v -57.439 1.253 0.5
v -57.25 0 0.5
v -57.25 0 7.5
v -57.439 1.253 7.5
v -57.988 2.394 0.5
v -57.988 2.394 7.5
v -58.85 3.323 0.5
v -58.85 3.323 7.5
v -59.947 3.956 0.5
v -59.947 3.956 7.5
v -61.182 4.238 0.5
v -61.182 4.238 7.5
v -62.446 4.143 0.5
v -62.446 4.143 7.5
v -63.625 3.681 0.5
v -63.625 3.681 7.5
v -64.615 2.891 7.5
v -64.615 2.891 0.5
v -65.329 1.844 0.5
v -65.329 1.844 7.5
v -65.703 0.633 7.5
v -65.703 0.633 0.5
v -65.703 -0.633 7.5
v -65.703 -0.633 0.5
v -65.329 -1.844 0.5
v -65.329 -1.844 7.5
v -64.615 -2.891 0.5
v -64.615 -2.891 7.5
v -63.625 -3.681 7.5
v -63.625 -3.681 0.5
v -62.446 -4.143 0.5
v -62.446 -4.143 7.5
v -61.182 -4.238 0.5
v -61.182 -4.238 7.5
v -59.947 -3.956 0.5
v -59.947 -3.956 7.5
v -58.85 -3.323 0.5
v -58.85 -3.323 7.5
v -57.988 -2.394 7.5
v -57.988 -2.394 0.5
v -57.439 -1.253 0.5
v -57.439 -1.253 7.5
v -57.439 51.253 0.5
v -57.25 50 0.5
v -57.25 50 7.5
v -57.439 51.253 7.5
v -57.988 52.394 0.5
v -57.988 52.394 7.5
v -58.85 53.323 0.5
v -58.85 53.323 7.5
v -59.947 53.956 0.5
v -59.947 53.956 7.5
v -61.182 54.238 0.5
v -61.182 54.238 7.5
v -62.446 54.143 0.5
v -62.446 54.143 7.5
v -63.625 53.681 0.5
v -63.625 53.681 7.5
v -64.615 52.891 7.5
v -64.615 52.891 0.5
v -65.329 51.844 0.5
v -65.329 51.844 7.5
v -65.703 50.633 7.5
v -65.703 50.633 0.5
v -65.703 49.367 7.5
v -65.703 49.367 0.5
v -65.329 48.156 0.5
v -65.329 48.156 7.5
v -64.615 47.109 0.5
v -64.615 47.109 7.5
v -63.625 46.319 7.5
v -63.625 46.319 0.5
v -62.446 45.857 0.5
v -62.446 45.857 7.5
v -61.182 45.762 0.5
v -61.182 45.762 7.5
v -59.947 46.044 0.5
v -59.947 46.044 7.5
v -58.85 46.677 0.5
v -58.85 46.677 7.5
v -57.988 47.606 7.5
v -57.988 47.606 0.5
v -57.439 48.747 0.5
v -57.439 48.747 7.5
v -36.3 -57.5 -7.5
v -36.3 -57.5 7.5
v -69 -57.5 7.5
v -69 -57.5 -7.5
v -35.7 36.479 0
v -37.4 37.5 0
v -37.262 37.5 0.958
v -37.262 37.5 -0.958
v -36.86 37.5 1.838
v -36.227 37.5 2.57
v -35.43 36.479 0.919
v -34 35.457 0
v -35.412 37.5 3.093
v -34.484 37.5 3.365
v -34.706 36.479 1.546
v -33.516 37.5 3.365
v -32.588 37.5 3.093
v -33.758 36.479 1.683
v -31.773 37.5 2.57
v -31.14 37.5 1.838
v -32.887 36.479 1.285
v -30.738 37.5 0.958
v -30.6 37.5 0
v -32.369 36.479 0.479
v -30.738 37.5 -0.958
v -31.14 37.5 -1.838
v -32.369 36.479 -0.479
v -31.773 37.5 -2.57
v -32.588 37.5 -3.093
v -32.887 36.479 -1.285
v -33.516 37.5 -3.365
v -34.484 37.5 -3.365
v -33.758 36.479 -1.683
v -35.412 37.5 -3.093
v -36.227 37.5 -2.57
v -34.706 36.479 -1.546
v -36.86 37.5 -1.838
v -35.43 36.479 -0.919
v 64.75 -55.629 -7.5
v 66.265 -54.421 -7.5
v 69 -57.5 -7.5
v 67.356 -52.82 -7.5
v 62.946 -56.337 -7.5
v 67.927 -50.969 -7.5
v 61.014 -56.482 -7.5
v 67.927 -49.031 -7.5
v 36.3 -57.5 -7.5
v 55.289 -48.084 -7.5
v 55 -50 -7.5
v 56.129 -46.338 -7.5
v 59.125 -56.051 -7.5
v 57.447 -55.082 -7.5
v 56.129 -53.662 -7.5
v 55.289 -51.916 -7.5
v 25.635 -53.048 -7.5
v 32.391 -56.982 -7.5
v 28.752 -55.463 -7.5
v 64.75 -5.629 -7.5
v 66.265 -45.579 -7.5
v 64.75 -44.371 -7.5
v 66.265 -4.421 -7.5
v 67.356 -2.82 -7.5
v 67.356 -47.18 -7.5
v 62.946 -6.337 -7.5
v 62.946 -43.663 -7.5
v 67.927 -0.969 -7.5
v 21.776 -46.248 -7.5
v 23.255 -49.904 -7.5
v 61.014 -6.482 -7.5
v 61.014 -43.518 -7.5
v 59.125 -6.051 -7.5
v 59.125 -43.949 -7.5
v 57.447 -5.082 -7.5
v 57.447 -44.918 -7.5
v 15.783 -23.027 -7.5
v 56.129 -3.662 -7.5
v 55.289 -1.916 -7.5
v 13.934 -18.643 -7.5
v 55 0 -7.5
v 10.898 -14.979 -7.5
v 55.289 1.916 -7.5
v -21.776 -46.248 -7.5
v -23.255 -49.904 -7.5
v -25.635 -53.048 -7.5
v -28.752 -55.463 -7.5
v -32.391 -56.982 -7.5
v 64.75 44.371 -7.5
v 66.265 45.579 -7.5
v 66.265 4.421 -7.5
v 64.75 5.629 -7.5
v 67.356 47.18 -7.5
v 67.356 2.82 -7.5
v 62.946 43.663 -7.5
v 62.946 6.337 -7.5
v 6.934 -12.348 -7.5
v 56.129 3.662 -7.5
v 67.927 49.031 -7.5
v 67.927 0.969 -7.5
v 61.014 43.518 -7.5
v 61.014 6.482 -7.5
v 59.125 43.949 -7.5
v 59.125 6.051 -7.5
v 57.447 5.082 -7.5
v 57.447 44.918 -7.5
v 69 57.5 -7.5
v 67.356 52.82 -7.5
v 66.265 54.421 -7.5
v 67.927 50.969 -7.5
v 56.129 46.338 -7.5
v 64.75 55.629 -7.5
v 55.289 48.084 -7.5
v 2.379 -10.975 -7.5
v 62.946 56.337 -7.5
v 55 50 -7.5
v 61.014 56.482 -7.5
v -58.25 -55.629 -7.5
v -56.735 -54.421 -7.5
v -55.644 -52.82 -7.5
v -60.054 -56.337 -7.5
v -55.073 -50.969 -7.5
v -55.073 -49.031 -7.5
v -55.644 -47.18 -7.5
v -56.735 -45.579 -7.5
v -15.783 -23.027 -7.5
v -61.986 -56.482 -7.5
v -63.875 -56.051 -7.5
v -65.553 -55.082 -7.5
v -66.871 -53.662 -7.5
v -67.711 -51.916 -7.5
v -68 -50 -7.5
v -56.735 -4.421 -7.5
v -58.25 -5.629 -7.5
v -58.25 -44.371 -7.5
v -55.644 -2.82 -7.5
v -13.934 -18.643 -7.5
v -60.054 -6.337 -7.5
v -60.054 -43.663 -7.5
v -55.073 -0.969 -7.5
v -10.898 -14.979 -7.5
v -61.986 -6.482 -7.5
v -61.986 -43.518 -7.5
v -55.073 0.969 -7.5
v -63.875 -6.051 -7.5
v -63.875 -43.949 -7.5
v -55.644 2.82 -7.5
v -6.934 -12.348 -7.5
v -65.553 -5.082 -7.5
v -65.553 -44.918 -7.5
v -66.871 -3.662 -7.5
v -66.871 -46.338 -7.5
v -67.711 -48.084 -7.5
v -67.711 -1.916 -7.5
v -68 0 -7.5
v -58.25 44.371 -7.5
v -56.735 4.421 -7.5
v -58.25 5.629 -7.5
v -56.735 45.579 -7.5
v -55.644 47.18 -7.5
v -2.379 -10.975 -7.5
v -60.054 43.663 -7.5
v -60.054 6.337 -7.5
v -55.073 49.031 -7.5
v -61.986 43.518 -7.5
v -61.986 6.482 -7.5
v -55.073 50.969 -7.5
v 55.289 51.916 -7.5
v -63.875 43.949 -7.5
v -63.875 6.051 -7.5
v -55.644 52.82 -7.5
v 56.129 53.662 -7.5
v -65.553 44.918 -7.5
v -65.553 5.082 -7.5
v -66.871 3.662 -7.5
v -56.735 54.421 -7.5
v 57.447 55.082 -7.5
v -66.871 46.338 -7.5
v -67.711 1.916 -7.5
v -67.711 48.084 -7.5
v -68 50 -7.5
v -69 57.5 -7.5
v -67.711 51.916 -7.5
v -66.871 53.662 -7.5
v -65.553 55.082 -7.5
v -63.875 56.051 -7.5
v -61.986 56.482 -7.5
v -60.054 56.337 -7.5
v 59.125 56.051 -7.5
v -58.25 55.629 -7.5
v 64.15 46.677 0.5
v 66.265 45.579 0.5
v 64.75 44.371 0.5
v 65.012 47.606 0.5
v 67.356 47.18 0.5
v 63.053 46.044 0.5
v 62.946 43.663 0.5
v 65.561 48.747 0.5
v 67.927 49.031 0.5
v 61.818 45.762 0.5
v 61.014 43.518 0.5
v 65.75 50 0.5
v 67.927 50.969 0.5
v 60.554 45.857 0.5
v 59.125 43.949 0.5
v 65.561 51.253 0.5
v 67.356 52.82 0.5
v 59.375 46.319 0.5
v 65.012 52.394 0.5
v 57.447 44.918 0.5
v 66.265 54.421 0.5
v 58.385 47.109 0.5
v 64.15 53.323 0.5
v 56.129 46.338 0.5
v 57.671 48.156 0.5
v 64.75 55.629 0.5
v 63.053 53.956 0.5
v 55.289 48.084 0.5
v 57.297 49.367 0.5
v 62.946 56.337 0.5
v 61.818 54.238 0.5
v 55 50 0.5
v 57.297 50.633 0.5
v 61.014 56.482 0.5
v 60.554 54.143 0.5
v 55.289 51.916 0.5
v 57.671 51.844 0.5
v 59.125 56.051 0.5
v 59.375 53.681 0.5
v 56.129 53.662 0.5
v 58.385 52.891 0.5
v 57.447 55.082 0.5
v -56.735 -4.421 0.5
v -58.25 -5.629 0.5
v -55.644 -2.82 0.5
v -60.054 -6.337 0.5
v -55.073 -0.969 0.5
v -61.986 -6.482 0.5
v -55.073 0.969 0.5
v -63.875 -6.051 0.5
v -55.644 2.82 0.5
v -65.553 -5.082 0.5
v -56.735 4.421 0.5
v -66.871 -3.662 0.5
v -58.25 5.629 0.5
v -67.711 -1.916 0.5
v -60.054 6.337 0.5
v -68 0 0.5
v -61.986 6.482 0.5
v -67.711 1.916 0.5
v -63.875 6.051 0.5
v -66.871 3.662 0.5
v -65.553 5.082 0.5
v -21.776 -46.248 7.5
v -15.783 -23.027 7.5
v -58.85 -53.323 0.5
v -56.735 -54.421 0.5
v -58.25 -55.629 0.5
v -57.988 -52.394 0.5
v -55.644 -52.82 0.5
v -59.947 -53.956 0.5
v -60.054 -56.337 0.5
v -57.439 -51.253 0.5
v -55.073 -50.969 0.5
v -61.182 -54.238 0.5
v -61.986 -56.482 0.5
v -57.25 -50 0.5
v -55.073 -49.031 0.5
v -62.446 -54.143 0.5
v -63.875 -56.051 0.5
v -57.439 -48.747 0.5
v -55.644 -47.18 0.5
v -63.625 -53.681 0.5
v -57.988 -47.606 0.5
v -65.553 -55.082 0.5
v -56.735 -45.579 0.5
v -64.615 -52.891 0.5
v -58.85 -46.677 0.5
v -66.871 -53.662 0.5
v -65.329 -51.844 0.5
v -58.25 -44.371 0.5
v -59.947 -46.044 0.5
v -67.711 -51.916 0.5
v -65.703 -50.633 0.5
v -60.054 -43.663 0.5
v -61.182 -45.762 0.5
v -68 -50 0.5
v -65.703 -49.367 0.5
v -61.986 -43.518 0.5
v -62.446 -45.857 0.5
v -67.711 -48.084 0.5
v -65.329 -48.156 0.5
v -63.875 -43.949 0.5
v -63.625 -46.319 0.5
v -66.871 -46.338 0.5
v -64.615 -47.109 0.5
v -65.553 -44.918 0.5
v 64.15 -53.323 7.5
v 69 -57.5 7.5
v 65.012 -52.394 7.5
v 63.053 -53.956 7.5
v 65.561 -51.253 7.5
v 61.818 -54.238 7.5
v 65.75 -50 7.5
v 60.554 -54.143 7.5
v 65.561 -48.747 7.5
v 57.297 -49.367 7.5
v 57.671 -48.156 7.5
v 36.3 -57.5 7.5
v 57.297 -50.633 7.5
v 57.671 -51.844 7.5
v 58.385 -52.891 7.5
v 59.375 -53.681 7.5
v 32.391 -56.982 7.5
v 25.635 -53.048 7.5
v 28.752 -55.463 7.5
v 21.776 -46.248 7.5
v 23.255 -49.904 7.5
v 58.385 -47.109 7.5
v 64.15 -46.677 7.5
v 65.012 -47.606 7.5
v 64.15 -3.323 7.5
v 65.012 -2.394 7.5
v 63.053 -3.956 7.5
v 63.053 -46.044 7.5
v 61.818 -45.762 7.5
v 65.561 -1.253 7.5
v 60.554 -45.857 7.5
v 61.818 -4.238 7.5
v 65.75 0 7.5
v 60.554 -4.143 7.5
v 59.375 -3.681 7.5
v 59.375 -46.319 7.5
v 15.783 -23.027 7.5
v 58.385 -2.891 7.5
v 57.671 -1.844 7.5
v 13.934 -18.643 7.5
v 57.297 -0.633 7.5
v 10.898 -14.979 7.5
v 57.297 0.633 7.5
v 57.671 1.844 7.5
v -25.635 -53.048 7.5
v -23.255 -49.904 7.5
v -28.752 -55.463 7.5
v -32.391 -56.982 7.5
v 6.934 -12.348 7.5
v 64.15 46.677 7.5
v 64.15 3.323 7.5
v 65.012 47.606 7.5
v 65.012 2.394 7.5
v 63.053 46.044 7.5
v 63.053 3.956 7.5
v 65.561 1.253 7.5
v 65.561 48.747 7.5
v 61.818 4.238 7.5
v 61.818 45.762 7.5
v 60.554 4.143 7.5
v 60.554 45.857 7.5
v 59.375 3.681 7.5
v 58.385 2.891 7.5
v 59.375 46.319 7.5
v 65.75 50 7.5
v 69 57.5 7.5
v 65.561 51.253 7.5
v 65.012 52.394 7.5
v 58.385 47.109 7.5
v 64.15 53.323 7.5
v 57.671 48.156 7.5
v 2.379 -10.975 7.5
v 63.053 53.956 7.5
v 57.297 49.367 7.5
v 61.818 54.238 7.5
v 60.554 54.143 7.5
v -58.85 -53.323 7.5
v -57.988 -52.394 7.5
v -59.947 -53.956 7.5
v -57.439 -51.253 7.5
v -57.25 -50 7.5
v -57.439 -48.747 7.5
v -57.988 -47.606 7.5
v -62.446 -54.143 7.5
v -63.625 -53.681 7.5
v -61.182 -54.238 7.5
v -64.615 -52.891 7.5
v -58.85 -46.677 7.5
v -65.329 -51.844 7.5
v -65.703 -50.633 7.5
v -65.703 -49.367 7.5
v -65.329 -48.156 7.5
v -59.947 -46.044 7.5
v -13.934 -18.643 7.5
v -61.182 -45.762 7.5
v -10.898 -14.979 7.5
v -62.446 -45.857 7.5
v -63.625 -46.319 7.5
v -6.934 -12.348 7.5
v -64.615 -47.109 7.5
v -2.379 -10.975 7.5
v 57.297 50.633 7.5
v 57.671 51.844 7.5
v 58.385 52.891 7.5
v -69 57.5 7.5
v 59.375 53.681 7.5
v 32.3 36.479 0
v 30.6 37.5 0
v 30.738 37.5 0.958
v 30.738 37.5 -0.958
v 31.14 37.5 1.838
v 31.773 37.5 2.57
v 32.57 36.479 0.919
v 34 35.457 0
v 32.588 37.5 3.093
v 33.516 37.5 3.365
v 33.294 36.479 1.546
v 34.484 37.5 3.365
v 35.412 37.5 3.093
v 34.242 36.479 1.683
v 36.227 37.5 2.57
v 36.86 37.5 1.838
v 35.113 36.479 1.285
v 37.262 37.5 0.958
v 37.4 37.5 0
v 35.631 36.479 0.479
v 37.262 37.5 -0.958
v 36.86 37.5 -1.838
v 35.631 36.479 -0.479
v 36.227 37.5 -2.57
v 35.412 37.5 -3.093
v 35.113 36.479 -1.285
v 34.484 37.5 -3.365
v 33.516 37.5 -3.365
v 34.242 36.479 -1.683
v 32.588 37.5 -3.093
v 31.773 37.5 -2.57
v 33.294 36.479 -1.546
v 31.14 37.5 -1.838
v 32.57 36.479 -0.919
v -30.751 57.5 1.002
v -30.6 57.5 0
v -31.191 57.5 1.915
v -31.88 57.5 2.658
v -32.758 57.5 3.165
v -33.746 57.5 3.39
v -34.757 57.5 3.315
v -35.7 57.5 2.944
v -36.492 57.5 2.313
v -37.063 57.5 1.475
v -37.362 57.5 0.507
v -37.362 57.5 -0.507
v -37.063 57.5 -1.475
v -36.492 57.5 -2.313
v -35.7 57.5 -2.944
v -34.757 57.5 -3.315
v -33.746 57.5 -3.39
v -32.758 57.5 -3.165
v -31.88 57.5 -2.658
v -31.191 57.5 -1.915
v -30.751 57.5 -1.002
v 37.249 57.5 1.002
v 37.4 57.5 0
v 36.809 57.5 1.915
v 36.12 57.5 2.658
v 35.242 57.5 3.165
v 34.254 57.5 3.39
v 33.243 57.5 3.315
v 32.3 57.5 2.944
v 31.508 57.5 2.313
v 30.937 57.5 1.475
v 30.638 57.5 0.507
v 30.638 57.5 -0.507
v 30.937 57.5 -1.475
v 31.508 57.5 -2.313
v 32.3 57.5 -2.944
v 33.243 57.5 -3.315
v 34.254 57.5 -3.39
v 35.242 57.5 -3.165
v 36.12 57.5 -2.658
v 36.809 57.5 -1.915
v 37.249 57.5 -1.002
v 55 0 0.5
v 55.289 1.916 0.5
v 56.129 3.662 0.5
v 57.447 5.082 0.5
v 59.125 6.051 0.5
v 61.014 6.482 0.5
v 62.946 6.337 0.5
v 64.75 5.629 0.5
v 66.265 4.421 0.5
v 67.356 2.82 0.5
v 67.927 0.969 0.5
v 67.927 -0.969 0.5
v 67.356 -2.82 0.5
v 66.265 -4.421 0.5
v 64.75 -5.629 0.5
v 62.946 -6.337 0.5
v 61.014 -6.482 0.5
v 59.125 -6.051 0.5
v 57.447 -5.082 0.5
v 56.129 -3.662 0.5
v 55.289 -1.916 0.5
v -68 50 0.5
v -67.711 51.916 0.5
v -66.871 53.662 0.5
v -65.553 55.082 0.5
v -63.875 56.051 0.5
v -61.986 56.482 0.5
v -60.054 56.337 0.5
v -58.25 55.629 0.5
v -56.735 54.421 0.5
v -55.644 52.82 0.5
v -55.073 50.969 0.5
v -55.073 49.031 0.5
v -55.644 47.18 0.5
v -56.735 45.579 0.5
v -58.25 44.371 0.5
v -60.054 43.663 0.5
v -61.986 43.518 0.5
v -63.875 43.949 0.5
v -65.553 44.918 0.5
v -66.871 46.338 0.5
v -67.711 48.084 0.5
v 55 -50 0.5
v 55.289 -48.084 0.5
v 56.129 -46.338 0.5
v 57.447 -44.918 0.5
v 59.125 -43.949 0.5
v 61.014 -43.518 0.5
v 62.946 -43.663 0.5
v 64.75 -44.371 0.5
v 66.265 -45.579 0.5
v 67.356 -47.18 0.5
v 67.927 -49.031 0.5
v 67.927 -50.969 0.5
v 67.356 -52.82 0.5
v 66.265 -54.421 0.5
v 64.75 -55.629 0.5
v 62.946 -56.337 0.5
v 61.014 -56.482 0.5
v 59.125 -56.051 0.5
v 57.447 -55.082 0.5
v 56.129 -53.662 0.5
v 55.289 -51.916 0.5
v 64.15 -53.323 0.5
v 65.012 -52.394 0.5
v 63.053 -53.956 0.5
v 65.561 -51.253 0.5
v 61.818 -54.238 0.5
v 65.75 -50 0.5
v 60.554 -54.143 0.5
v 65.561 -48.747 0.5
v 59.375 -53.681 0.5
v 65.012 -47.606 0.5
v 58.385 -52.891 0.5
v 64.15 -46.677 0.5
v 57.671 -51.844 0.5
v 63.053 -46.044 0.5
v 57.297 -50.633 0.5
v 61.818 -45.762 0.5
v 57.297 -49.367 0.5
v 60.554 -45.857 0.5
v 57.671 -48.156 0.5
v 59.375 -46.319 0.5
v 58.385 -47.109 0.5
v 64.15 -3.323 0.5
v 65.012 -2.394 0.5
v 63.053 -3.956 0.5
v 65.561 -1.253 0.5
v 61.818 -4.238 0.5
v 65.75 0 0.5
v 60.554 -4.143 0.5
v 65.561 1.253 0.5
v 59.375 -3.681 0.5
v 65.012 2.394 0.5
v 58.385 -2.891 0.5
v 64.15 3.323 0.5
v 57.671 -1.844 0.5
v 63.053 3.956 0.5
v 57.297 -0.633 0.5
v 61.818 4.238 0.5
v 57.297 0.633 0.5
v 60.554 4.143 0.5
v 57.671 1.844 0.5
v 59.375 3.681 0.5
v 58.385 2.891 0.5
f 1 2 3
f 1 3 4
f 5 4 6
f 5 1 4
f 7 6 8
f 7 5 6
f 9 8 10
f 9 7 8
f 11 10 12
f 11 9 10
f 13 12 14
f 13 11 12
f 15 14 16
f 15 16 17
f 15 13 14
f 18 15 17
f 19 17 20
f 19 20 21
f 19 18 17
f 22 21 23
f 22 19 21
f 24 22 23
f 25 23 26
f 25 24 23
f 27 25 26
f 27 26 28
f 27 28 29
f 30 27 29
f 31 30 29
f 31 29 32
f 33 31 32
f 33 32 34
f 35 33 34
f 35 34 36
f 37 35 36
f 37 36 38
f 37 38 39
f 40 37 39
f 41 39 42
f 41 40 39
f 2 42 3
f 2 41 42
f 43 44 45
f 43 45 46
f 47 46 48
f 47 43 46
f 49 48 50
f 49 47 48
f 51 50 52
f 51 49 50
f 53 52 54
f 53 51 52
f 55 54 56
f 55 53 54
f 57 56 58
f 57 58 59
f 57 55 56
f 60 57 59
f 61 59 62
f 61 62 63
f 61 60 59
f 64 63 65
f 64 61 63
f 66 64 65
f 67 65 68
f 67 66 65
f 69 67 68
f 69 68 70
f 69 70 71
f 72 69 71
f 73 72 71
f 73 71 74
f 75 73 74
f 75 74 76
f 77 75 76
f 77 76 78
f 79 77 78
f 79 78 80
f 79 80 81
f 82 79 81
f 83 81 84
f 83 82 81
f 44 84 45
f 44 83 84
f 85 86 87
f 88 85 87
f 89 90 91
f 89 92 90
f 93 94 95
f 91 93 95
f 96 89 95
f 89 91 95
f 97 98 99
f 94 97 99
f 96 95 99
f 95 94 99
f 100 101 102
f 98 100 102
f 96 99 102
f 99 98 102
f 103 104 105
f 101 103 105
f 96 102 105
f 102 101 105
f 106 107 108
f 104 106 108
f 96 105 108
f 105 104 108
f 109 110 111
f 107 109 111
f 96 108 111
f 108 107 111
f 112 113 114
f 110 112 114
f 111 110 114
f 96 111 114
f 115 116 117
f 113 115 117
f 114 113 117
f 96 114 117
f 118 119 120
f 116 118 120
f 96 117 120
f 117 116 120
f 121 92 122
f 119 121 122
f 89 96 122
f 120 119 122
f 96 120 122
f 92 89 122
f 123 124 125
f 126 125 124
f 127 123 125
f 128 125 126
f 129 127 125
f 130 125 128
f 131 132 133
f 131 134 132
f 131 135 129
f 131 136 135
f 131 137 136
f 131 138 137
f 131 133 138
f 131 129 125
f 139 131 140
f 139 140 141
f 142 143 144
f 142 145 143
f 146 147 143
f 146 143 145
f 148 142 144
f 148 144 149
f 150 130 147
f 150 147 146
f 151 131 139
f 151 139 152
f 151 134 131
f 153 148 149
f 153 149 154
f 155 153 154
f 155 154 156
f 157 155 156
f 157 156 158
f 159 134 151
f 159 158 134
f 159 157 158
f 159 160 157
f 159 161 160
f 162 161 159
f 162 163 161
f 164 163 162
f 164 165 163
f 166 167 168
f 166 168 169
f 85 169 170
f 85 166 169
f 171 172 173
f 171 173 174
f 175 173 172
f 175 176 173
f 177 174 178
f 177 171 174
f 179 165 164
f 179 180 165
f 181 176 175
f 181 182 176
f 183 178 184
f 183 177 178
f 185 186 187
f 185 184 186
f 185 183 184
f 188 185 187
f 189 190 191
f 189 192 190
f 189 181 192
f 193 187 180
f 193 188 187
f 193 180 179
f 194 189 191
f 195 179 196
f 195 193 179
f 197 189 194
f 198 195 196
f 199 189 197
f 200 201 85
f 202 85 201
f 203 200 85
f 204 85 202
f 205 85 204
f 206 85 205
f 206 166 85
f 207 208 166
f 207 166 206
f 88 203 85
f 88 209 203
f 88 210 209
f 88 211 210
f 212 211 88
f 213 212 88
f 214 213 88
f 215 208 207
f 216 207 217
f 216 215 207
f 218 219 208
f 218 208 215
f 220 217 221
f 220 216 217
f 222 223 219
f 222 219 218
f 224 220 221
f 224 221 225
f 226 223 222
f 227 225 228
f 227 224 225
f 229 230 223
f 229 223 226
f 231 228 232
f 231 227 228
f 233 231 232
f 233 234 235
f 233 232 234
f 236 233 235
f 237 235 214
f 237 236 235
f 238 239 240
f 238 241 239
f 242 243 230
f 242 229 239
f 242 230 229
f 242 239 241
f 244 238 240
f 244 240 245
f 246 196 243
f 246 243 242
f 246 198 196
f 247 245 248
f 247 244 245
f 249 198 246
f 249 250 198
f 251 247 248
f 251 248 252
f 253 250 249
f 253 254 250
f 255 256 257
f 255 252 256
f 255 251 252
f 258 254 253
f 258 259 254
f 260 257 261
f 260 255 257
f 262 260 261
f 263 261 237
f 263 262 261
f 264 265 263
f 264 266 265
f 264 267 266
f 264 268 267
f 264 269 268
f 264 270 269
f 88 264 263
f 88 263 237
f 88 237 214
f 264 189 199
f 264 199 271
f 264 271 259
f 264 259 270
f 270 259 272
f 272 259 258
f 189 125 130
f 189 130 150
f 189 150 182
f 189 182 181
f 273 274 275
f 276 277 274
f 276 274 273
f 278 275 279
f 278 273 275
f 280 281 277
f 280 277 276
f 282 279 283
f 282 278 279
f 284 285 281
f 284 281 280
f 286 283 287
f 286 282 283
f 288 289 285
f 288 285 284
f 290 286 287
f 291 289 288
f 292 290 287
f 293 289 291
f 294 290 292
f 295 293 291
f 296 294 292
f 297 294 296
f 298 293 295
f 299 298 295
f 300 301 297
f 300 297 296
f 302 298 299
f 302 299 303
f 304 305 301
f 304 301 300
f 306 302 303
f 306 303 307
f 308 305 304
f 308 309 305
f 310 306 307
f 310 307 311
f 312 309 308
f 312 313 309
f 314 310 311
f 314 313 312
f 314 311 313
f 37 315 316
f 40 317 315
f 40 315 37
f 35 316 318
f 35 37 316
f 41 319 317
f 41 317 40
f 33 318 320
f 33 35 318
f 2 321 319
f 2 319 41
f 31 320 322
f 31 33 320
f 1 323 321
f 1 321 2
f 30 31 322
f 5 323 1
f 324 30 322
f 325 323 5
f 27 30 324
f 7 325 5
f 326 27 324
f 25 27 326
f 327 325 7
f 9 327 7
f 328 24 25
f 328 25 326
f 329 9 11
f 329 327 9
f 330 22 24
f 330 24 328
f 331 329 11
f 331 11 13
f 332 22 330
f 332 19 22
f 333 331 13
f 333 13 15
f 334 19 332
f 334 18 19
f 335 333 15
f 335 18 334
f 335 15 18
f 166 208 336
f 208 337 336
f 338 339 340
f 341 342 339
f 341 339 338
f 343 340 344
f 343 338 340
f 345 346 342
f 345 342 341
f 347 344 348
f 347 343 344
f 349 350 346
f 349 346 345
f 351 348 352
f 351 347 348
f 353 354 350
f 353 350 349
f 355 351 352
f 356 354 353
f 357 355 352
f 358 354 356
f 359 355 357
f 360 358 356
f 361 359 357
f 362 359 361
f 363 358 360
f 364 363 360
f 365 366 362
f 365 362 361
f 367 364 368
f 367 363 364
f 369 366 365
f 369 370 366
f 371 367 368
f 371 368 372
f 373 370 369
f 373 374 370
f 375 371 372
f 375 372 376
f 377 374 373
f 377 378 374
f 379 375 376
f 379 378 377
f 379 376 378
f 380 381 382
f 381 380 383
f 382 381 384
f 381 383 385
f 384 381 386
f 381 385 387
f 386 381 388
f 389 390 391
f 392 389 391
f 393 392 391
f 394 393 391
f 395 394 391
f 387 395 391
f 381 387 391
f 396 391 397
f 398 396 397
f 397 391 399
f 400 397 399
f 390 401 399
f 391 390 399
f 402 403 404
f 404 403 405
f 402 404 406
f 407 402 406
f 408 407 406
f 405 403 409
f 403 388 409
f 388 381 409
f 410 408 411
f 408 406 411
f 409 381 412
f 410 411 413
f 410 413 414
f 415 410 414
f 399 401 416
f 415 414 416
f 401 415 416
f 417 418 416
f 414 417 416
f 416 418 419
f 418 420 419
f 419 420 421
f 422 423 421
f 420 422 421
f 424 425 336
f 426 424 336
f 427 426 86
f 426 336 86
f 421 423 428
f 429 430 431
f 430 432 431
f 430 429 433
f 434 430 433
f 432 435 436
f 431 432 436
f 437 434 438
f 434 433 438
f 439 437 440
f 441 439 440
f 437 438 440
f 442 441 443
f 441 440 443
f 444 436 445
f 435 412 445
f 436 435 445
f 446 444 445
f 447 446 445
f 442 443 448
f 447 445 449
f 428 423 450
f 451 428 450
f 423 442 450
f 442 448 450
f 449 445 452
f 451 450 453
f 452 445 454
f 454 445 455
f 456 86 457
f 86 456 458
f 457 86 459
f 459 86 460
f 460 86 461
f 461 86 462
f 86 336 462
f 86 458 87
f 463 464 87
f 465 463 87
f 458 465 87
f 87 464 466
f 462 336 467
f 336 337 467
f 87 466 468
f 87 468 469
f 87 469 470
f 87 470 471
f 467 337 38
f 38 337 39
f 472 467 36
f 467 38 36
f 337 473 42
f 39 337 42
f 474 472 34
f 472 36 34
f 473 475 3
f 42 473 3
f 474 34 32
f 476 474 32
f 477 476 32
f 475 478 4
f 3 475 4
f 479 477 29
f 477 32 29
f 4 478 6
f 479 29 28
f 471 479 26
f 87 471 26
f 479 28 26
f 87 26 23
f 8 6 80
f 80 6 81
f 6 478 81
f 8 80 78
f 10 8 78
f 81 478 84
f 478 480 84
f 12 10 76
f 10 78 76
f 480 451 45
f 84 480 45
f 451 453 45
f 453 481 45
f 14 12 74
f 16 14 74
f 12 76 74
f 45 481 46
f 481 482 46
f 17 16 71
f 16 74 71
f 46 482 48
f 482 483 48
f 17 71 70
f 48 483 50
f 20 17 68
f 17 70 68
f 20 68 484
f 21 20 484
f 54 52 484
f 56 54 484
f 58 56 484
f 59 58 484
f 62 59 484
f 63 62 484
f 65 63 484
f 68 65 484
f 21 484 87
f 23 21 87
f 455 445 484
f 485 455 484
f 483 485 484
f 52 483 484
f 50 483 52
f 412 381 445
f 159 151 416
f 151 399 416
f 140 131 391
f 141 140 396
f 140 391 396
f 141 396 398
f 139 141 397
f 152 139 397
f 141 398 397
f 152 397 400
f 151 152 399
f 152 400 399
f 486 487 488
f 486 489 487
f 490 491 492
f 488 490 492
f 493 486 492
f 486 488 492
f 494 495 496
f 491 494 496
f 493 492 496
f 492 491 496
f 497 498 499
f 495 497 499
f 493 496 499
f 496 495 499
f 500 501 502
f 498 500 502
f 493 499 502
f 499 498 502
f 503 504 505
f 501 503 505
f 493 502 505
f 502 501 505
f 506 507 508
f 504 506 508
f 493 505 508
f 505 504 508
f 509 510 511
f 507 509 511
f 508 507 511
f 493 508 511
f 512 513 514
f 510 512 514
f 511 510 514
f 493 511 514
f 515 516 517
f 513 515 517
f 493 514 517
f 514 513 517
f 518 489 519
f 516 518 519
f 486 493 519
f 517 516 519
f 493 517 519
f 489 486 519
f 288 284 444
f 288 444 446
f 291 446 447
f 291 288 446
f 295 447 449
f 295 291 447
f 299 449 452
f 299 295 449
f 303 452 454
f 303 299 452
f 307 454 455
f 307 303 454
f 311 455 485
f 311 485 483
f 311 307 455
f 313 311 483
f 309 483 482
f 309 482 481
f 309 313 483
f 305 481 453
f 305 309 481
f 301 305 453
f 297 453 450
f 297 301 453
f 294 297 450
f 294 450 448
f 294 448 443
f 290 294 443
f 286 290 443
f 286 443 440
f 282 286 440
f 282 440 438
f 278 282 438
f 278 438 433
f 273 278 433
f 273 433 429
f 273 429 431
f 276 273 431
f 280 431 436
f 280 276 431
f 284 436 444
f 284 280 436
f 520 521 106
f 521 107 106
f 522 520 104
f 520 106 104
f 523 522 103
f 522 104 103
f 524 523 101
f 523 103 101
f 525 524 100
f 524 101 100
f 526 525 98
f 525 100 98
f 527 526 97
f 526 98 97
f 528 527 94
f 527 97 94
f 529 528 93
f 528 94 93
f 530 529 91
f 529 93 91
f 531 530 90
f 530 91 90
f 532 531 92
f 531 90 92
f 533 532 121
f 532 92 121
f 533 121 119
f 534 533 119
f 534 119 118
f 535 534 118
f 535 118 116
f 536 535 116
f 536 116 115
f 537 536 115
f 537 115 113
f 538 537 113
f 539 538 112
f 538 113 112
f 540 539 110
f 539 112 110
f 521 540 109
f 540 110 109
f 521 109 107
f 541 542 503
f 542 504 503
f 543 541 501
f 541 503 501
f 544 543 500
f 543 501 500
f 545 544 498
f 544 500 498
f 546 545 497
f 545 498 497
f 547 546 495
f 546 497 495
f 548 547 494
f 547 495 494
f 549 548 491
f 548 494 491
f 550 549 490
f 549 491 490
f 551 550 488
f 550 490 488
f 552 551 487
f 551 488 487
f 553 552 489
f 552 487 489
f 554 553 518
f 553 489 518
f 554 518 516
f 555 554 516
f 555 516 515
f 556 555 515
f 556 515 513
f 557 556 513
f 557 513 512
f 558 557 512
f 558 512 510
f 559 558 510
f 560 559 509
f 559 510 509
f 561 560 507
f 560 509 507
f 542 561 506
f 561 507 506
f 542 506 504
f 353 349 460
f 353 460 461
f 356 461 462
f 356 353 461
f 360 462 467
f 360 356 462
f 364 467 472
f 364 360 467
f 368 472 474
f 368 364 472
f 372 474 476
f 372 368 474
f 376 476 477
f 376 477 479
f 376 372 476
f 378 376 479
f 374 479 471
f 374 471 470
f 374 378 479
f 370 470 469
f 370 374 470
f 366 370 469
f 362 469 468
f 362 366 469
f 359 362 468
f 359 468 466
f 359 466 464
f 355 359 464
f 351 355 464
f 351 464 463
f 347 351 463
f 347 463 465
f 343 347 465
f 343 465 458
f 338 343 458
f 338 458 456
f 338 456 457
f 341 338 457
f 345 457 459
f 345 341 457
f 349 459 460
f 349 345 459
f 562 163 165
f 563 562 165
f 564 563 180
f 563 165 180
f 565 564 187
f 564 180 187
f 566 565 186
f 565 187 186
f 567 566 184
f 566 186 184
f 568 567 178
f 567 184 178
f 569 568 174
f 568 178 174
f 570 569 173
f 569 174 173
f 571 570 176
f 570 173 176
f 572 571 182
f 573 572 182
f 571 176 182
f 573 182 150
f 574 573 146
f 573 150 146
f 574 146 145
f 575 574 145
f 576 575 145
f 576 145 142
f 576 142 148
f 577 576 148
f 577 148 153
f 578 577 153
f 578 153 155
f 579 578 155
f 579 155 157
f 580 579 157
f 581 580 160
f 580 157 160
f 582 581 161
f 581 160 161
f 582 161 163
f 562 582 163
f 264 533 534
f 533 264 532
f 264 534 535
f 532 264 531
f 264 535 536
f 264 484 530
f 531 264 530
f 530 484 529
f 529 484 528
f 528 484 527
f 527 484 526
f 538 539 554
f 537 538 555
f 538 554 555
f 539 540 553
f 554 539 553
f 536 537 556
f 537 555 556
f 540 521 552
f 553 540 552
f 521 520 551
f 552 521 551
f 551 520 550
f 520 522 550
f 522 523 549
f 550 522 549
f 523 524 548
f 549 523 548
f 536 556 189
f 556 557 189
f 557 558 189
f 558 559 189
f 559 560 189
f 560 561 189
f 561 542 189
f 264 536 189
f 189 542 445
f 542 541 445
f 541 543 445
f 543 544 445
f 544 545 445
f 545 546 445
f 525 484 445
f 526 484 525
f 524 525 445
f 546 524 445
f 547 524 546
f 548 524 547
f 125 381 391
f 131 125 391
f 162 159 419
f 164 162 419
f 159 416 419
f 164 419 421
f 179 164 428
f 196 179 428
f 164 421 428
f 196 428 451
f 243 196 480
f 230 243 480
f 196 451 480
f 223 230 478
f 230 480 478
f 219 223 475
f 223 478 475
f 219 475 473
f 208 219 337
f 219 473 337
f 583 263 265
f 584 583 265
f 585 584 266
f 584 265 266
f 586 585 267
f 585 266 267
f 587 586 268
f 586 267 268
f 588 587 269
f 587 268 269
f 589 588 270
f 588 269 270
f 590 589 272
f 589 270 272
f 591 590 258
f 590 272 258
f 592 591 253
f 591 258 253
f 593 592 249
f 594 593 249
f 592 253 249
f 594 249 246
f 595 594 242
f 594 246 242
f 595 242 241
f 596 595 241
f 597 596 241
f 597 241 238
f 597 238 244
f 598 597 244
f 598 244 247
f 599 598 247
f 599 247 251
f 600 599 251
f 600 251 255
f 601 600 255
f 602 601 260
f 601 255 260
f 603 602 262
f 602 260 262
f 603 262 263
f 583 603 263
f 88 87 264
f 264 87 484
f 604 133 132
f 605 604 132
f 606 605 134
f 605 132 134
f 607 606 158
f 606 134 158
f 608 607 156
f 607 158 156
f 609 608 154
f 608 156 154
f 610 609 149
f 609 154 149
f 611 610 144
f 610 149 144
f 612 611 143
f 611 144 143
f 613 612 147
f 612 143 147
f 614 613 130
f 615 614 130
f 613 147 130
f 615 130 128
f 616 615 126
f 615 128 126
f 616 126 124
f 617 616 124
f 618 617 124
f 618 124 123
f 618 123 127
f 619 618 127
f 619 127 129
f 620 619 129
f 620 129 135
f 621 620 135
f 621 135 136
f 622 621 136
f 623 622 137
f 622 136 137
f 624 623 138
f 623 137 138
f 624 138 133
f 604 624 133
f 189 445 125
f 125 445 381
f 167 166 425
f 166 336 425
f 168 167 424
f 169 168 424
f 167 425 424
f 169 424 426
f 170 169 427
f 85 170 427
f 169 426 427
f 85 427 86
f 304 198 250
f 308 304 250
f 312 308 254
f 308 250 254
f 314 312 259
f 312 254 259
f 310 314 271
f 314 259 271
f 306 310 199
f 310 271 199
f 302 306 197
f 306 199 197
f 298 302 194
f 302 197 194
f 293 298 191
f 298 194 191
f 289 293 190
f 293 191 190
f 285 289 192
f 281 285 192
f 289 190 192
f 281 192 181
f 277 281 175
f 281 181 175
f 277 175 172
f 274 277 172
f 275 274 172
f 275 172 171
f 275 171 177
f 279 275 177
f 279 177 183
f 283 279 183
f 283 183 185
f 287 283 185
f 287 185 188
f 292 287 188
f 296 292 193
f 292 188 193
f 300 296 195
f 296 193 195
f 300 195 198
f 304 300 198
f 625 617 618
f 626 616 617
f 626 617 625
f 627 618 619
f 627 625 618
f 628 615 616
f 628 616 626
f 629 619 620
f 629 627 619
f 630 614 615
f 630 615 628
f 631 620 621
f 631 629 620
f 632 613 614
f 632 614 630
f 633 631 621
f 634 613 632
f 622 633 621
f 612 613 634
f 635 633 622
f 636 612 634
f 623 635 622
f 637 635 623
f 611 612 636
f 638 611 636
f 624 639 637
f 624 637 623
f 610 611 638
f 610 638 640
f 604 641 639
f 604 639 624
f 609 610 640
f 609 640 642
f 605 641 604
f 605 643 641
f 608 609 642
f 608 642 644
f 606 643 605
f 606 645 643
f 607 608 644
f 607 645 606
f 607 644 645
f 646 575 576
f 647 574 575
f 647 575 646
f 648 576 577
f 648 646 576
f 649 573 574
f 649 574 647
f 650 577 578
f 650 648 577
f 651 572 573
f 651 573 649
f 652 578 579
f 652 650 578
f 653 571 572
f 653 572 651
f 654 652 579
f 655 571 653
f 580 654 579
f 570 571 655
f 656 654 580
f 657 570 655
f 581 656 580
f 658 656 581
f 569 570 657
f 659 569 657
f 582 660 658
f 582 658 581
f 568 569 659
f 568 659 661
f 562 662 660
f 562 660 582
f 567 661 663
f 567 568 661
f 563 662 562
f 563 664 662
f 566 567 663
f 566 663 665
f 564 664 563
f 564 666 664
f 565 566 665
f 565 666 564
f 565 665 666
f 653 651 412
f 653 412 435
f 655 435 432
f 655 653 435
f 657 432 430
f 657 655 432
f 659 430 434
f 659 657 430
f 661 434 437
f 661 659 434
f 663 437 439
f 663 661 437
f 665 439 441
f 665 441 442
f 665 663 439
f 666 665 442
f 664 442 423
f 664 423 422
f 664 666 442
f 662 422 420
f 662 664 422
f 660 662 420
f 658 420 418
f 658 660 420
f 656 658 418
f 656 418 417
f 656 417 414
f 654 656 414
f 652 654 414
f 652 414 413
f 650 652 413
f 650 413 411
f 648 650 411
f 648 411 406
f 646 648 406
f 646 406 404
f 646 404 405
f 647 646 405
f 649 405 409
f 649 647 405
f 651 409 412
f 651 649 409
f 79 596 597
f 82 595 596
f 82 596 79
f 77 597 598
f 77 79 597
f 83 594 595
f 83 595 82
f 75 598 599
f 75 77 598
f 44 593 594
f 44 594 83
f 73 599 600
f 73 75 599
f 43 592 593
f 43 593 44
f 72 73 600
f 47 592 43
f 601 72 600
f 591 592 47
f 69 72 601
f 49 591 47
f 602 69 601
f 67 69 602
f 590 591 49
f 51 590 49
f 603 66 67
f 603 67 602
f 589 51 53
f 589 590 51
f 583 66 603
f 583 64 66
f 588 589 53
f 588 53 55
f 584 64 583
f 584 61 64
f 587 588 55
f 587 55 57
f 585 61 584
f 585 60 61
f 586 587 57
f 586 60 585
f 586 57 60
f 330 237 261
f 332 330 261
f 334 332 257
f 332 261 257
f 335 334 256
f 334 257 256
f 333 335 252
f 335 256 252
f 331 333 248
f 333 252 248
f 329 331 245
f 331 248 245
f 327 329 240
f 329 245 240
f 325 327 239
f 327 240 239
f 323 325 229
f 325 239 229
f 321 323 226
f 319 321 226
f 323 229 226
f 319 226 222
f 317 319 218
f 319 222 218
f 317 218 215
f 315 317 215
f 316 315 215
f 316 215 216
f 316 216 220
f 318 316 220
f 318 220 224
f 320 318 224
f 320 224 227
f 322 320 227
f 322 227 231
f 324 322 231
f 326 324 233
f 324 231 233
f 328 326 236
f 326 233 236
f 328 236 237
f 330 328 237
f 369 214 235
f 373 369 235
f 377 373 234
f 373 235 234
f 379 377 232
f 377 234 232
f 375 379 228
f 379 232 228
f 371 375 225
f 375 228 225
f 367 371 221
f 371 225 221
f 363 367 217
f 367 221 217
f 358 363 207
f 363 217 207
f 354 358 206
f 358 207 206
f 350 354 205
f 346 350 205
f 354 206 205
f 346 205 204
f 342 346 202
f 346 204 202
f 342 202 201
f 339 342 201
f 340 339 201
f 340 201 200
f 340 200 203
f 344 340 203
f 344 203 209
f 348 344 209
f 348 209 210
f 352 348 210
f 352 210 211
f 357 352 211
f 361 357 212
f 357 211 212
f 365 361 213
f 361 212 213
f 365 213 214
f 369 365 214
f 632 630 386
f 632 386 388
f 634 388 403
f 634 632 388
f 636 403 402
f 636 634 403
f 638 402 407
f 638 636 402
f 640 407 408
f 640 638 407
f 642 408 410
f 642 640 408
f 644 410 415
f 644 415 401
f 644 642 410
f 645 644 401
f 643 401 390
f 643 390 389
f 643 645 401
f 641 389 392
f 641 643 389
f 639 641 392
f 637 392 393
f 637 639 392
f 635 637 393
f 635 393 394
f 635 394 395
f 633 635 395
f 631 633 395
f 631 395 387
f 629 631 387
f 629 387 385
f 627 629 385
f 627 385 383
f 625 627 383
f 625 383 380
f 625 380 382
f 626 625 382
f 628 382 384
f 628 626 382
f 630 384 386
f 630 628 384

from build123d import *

# Parameters (mm, degrees)
CROQUIS1_R                = 4.25
SALIENTE_EXTRUIR1_DEPTH   = 7.5
CROQUIS2_R                = 6.5
CORTAR_EXTRUIR1_DEPTH     = 8
TALADRO_ROSCADO_M81_D     = 6.8
TALADRO_ROSCADO_M81_DEPTH = 20
TALADRO_ROSCADO_M81_TIP   = 2.042926105


with BuildPart() as part:
    # Croquis1 → Saliente-Extruir1 (new body, symmetric)
    with BuildSketch(Plane.XY):
        with BuildLine():
            Line((69, -57.5), (36.3, -57.5))
            ThreePointArc((36.3, -57.5), (27.113751898, -54.358028749), (21.775894122, -46.248379441))
            Line((21.775894122, -46.248379441), (15.782861721, -23.026761008))
            ThreePointArc((15.782861721, -23.026761008), (0, -10.8), (-15.782861721, -23.026761008))
            Line((-15.782861721, -23.026761008), (-21.775894122, -46.248379441))
            ThreePointArc((-21.775894122, -46.248379441), (-27.113751898, -54.358028749), (-36.3, -57.5))
            Line((-36.3, -57.5), (-69, -57.5))
            Line((-69, -57.5), (-69, 57.5))
            Line((-69, 57.5), (69, 57.5))
            Line((69, 57.5), (69, -57.5))
        make_face()
        with Locations((-61.5, 50)):
            Circle(CROQUIS1_R, mode=Mode.SUBTRACT)
        with Locations((-61.5, 0)):
            Circle(CROQUIS1_R, mode=Mode.SUBTRACT)
        with Locations((-61.5, -50)):
            Circle(CROQUIS1_R, mode=Mode.SUBTRACT)
        with Locations((61.5, 50)):
            Circle(CROQUIS1_R, mode=Mode.SUBTRACT)
        with Locations((61.5, 0)):
            Circle(CROQUIS1_R, mode=Mode.SUBTRACT)
        with Locations((61.5, -50)):
            Circle(CROQUIS1_R, mode=Mode.SUBTRACT)
    extrude(amount=SALIENTE_EXTRUIR1_DEPTH, both=True)

    # Croquis2 → Cortar-Extruir1 (cut)
    with BuildSketch(Plane(origin=(0, 0, -7.5), x_dir=(-1, 0, 0), z_dir=(0, 0, -1))):
        with Locations((-61.5, 50)):
            Circle(CROQUIS2_R)
        with Locations((-61.5, 0)):
            Circle(CROQUIS2_R)
        with Locations((-61.5, -50)):
            Circle(CROQUIS2_R)
        with Locations((61.5, 50)):
            Circle(CROQUIS2_R)
        with Locations((61.5, 0)):
            Circle(CROQUIS2_R)
        with Locations((61.5, -50)):
            Circle(CROQUIS2_R)
    extrude(amount=-CORTAR_EXTRUIR1_DEPTH, mode=Mode.SUBTRACT)

    # Taladro roscado M81
    with Locations(Plane(origin=(0, 57.5, 0), x_dir=(-1, 0, 0), z_dir=(0, 1, 0))):
        with Locations((34, 0), (-34, 0)):
            Hole(TALADRO_ROSCADO_M81_D / 2, depth=TALADRO_ROSCADO_M81_DEPTH)
            with Locations((0, 0, -(TALADRO_ROSCADO_M81_DEPTH + TALADRO_ROSCADO_M81_TIP / 2))):  # 118° drill point
                Cone(0, TALADRO_ROSCADO_M81_D / 2, TALADRO_ROSCADO_M81_TIP, mode=Mode.SUBTRACT)


solid = part.part
